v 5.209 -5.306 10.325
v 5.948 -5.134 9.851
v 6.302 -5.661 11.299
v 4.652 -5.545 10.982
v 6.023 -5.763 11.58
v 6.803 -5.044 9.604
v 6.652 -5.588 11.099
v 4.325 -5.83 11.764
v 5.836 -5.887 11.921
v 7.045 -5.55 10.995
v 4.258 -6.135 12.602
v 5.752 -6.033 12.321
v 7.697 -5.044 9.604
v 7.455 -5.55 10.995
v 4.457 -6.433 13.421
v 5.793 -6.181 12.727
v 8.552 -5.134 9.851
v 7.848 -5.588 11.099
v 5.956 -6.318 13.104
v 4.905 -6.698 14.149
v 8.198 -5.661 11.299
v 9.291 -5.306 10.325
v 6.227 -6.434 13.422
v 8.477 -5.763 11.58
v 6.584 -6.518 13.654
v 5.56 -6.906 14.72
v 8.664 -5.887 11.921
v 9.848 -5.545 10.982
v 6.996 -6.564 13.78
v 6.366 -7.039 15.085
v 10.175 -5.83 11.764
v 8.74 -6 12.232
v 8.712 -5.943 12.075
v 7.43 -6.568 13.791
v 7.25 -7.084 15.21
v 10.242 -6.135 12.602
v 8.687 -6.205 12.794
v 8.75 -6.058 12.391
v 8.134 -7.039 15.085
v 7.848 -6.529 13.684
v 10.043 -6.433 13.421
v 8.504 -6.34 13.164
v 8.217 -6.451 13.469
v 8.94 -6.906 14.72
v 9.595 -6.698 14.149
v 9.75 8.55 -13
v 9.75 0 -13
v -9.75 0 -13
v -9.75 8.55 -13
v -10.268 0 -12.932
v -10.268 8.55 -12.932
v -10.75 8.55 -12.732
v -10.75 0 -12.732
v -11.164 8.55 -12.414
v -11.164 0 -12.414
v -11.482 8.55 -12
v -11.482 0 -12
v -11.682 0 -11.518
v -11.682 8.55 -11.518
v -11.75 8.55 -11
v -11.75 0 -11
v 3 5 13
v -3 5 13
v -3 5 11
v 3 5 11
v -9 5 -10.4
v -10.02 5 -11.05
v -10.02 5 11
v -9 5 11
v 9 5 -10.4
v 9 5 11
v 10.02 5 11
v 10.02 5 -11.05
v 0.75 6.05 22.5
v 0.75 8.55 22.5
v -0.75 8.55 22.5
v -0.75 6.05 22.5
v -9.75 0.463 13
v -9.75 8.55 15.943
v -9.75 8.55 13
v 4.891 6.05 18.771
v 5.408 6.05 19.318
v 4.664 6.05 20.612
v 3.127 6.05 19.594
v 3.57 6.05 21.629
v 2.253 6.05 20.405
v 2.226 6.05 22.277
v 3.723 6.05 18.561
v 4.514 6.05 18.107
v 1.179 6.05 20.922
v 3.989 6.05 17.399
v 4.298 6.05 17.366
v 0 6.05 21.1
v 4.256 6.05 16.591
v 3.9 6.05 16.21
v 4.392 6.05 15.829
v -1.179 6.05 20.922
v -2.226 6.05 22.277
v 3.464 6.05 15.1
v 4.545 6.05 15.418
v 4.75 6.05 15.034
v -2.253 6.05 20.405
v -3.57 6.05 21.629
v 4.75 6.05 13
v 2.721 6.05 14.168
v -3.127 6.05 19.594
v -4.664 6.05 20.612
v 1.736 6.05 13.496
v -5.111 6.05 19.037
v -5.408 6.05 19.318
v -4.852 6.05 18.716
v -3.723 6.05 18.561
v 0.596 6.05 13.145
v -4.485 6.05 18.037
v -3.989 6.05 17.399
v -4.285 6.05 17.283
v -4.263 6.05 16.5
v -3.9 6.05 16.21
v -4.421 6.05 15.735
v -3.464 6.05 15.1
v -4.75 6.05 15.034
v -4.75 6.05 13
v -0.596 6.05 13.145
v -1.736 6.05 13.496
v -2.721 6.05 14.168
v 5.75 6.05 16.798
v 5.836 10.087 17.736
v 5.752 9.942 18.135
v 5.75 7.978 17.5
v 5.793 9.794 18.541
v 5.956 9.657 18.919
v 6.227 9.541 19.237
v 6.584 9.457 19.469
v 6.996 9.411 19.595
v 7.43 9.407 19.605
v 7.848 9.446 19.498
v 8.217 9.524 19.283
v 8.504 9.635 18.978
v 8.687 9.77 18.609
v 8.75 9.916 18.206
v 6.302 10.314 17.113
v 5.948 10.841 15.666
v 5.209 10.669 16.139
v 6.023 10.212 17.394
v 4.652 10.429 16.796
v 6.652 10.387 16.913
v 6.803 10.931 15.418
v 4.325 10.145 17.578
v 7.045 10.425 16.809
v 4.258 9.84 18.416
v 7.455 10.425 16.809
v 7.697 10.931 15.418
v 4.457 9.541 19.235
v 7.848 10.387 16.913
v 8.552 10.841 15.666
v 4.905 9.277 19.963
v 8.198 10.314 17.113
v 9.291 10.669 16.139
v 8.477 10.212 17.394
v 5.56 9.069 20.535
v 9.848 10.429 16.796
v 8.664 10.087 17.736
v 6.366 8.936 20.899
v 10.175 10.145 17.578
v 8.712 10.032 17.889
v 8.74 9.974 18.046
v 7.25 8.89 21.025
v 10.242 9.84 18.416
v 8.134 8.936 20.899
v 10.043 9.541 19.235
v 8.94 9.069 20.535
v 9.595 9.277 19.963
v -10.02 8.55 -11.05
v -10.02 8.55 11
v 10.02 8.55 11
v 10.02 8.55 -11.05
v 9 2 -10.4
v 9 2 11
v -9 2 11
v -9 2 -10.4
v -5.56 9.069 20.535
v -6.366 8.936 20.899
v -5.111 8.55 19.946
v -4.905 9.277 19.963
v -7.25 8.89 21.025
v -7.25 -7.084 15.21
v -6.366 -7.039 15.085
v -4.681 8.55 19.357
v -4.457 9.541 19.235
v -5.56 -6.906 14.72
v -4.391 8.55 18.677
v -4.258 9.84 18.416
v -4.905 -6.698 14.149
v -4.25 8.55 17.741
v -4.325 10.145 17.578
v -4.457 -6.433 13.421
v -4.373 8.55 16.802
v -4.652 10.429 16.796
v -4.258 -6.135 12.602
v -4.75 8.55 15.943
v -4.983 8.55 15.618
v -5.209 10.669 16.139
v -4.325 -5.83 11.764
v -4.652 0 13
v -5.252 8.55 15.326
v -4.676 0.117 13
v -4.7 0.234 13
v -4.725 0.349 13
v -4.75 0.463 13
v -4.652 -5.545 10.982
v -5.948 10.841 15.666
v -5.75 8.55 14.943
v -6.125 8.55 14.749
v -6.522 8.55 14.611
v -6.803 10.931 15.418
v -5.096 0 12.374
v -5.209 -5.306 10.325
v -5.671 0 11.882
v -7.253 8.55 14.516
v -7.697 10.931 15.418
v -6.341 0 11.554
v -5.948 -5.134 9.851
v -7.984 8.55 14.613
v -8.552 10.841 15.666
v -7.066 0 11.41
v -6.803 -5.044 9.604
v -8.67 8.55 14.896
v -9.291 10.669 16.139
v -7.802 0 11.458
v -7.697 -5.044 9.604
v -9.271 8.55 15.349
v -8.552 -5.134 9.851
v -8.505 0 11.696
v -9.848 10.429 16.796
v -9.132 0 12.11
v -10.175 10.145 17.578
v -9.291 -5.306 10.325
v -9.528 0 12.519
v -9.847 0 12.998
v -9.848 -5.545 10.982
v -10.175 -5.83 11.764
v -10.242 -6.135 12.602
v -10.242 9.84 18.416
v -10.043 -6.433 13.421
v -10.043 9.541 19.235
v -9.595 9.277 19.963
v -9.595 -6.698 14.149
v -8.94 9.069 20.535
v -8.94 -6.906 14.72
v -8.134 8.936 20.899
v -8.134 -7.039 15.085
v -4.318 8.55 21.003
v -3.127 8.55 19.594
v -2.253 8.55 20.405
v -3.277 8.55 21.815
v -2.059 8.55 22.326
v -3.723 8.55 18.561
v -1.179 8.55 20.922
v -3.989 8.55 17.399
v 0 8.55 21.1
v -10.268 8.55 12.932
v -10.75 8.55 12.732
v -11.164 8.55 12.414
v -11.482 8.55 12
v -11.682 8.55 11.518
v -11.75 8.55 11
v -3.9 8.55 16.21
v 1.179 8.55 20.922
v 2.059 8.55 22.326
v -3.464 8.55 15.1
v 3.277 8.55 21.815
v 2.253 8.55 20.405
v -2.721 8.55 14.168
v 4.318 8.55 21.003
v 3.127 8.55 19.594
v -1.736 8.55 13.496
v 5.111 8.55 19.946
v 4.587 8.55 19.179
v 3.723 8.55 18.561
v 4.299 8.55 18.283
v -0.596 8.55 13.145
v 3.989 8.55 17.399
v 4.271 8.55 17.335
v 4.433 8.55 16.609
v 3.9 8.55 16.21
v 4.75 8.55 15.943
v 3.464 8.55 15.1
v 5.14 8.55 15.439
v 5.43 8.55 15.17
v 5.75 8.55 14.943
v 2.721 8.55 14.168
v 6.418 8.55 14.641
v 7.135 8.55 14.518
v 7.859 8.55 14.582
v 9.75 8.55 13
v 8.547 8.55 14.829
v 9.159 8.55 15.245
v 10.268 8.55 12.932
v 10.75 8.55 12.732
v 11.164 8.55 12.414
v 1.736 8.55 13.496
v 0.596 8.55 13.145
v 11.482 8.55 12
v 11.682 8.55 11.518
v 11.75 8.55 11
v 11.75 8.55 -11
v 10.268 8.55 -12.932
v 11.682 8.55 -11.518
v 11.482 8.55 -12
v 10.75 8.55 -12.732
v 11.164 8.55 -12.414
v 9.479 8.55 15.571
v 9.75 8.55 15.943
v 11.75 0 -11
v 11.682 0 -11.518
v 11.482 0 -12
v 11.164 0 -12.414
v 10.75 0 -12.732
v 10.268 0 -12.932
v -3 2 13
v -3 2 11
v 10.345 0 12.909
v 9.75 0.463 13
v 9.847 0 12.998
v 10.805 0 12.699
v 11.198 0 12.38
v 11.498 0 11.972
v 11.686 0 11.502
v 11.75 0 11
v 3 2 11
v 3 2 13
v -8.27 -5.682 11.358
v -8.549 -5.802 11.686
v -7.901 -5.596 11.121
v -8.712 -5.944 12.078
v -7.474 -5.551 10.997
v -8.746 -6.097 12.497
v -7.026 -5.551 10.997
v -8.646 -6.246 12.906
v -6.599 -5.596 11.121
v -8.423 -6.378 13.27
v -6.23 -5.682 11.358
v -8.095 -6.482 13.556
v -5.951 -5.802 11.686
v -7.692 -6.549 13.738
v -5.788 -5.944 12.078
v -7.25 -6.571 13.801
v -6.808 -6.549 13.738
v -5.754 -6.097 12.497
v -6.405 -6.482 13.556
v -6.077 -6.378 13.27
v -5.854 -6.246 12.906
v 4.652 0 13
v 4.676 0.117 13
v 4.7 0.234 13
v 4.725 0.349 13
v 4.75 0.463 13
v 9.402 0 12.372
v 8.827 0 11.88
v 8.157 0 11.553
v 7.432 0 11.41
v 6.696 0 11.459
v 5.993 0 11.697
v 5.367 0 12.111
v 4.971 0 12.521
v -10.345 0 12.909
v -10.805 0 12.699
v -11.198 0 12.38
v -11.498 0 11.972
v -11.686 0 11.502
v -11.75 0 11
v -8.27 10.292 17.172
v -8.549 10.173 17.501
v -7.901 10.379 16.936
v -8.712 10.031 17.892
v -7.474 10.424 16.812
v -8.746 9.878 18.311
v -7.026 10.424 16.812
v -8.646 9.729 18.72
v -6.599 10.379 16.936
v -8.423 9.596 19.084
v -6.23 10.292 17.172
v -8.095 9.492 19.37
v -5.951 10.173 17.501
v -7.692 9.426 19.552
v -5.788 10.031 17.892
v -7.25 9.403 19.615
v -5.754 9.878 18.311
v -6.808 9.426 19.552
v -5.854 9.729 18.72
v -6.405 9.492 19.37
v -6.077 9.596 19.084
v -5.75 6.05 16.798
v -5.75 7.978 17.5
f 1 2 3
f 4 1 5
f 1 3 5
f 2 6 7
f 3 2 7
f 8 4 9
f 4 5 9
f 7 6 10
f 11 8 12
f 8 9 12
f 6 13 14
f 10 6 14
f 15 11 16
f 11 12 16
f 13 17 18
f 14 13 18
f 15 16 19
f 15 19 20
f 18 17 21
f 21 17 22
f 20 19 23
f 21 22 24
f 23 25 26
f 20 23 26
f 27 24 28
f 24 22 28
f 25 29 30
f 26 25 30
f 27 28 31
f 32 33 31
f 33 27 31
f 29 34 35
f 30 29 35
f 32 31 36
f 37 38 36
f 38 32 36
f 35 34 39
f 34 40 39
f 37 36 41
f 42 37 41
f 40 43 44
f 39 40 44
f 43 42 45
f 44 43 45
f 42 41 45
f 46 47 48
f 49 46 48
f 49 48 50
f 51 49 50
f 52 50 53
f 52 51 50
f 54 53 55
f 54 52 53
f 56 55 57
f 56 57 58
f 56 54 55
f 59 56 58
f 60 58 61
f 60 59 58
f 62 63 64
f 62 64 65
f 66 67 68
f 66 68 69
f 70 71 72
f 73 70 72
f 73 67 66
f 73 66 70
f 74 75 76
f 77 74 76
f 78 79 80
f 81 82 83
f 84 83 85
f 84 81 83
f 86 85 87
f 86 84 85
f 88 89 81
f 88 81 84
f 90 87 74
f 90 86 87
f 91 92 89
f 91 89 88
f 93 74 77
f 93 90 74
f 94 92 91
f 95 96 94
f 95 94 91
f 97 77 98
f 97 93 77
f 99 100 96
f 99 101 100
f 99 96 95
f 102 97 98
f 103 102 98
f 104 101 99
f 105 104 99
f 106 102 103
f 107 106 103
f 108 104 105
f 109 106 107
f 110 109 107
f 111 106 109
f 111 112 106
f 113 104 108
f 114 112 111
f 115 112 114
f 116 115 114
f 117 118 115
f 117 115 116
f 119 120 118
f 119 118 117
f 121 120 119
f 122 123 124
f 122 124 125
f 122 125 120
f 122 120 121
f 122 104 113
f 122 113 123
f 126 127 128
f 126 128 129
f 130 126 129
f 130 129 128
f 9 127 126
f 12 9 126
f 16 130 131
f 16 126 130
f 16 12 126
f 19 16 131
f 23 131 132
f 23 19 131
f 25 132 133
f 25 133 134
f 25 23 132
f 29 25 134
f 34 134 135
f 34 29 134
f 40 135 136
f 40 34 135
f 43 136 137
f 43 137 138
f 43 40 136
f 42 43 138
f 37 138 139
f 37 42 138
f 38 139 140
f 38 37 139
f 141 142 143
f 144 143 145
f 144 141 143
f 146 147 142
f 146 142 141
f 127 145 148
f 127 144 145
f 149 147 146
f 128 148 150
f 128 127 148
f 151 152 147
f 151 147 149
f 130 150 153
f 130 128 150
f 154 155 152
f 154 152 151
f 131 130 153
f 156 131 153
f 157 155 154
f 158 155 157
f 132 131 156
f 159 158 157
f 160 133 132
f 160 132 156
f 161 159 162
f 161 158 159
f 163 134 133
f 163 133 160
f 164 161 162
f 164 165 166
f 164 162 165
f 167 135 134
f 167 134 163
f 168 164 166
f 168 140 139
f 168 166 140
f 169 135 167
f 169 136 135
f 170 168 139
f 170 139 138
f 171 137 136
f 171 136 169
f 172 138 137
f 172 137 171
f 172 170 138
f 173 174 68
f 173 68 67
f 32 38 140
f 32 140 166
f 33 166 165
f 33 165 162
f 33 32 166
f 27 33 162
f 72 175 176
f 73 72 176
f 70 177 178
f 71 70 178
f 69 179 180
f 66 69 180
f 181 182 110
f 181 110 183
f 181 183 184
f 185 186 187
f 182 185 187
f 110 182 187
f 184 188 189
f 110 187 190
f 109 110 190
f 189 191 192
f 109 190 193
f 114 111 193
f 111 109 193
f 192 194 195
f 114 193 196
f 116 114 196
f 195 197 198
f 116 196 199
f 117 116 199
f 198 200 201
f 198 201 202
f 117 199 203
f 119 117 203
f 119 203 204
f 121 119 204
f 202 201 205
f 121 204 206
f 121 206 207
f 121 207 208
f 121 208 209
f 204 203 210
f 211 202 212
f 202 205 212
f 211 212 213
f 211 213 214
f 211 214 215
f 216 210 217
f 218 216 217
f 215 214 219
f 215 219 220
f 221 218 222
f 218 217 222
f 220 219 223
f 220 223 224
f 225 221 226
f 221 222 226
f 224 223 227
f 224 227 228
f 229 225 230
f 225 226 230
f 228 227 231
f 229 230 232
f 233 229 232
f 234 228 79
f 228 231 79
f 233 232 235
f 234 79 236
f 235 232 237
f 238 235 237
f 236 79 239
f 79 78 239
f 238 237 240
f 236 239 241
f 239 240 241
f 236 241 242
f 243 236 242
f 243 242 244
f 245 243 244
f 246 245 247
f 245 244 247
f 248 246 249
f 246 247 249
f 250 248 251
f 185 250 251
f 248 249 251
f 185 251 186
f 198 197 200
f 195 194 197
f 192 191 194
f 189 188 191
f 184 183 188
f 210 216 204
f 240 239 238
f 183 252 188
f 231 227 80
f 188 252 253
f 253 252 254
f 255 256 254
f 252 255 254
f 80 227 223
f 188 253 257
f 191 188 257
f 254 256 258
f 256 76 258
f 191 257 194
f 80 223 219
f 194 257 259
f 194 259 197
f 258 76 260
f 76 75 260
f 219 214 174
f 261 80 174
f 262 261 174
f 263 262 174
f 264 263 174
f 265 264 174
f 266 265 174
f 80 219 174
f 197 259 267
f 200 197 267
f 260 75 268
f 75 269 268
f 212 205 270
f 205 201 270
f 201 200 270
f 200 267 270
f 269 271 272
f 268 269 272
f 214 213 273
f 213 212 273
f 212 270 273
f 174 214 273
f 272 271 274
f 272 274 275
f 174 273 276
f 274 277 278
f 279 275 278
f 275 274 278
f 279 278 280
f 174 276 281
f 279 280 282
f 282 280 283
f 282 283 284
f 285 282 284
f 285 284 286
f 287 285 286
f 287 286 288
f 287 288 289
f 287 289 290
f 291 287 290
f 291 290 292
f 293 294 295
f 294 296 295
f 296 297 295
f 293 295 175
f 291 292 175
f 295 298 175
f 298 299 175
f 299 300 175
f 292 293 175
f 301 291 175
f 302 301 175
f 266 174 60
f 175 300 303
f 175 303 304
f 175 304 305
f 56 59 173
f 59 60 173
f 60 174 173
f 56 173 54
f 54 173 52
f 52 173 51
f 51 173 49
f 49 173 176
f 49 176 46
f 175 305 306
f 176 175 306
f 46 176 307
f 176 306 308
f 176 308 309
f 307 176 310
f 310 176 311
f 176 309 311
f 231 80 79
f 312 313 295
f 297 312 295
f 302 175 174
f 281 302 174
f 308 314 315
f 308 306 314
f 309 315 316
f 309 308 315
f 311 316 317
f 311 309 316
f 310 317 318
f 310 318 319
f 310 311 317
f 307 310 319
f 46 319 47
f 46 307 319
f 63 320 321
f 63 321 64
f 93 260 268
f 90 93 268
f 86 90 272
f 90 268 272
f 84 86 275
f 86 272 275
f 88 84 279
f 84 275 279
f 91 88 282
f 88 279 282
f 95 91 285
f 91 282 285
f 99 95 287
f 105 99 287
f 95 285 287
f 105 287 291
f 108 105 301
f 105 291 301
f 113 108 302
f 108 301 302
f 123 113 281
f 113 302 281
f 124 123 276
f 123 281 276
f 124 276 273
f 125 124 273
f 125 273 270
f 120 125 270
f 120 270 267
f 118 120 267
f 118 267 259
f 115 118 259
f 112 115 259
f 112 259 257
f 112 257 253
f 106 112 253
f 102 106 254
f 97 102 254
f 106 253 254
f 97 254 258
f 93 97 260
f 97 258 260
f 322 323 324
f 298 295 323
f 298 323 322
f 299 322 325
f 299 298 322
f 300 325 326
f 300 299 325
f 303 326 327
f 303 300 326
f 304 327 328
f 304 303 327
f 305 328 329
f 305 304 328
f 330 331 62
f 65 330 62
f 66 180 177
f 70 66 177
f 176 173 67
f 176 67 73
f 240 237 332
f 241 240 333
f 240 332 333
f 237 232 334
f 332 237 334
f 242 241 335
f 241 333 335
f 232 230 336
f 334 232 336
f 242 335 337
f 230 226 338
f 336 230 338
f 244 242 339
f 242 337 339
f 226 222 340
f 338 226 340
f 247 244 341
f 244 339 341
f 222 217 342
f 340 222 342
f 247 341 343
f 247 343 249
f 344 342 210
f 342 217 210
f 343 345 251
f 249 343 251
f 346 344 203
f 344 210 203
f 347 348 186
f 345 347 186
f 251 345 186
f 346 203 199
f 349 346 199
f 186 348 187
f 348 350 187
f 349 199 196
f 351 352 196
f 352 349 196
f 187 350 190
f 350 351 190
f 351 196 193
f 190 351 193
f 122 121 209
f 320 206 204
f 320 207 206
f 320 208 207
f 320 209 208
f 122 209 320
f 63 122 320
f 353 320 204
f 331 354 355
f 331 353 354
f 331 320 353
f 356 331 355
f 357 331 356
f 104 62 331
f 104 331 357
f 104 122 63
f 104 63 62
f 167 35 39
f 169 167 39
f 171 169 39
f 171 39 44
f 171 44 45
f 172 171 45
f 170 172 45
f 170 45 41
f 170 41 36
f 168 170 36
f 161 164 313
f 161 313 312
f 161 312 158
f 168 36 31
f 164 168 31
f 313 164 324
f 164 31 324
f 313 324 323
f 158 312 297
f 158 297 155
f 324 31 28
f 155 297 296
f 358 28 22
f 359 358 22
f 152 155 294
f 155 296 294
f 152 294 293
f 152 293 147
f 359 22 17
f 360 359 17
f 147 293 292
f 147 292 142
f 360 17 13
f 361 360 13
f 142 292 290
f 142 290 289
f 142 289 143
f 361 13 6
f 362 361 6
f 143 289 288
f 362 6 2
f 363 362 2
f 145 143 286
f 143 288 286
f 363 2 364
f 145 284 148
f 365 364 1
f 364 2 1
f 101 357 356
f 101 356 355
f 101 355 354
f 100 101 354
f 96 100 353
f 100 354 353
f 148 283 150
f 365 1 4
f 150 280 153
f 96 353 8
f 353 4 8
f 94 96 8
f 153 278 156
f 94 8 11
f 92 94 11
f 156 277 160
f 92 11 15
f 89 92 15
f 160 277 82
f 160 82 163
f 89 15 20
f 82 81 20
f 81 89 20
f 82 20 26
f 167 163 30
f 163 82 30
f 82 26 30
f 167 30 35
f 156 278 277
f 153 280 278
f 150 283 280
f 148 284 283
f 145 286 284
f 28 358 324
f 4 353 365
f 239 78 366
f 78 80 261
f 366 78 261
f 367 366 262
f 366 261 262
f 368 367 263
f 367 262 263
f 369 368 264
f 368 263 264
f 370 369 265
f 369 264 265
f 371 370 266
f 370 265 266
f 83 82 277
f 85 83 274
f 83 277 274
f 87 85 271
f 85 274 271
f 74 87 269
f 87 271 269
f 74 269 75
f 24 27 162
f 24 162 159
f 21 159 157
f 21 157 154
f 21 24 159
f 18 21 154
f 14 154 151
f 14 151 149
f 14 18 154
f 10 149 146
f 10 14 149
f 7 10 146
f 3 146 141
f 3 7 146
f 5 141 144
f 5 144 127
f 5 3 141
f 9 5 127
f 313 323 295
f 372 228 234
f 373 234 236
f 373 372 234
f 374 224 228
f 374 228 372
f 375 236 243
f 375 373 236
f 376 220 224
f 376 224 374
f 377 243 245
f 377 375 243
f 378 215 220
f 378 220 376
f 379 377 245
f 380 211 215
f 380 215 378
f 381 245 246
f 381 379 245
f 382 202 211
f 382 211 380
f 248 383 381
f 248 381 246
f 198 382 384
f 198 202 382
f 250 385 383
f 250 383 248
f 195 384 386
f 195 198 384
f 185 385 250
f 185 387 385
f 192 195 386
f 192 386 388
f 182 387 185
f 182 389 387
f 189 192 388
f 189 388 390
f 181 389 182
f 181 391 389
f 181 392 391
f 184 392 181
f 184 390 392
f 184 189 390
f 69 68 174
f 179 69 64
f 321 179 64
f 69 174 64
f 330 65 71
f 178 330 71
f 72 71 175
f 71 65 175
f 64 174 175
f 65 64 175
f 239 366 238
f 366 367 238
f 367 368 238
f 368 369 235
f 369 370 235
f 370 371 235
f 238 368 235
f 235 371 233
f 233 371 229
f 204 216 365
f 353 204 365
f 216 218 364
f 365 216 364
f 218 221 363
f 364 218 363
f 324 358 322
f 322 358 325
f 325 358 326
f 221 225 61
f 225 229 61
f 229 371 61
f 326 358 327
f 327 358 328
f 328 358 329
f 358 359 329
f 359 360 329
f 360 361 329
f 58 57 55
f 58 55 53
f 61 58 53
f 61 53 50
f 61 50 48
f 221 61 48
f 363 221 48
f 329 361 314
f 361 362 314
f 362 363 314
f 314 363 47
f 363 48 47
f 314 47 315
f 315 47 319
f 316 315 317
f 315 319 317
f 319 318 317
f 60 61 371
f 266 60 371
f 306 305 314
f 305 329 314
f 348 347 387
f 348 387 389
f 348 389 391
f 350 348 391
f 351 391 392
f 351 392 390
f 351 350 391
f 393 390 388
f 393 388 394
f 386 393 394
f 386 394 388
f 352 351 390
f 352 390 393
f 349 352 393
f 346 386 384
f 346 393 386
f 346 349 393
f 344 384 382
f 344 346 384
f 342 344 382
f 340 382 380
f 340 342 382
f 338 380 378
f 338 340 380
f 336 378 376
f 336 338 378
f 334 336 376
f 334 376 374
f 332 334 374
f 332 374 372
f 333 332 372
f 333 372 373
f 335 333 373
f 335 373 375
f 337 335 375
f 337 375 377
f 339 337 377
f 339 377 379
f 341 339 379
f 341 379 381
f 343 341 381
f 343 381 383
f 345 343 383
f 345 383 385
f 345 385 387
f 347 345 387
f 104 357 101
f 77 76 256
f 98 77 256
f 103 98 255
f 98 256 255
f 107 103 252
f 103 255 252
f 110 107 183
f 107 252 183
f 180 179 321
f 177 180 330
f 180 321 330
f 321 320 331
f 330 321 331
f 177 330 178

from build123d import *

# Parameters (mm, degrees)
BOSS_EXTRUDE1_DEPTH       = 8.55
SKETCH1_4_W               = 18
SKETCH1_4_H               = 23.4
BOSS_EXTRUDE2_DEPTH       = 2
SKETCH2_W                 = 20.04
SKETCH2_H                 = 24.05
CUT_EXTRUDE1_DEPTH        = 3.55
SKETCH3_W                 = 6
SKETCH3_H                 = 3
BOSS_EXTRUDE4_DEPTH       = 2
FILLET1_R                 = 2
BOSS_EXTRUDE5_DEPTH       = 23.5
SKETCH6_W                 = 2
SKETCH6_H                 = 3.111945503
SKETCH6_W_2               = 9.5
CUT_EXTRUDE2_DEPTH        = 23
SKETCH7_W                 = 5
SKETCH7_H                 = 1.291023664
BOSS_EXTRUDE6_DEPTH       = 1
BOSS_EXTRUDE11_DEPTH      = 2
BOSS_EXTRUDE11_DEPTH_BACK = 15
SKETCH8_R                 = 3
CUT_EXTRUDE3_DEPTH        = 2
CUT_EXTRUDE3_DEPTH_BACK   = 15
SKETCH8_5_R               = 1.5
SKETCH10_R                = 4
BOSS_EXTRUDE13_DEPTH      = 2.5


with BuildPart() as part:
    # Sketch1 → Boss-Extrude1 (new body)
    with BuildSketch(Plane(origin=(0, 0, 0), x_dir=(1, 0, 0), z_dir=(0, 1, 0))):
        Polygon((-11.75, 13), (-11.75, -13), (-9, -13), (-9, 10.4), (9, 10.4), (9, -13), (11.75, -13), (11.75, 13), align=None)
    extrude(amount=BOSS_EXTRUDE1_DEPTH)

    # Sketch1<4> → Boss-Extrude2 (add)
    with BuildSketch(Plane(origin=(0, 0, 0), x_dir=(1, 0, 0), z_dir=(0, 1, 0))):
        with Locations((0, -1.3)):
            Rectangle(SKETCH1_4_W, SKETCH1_4_H)
    extrude(amount=BOSS_EXTRUDE2_DEPTH)

    # Sketch2 → Cut-Extrude1 (cut)
    with BuildSketch(Plane(origin=(0, 8.55, 0), x_dir=(1, 0, 0), z_dir=(0, 1, 0))):
        with Locations((0, -0.975)):
            Rectangle(SKETCH2_W, SKETCH2_H)
    extrude(amount=-CUT_EXTRUDE1_DEPTH, mode=Mode.SUBTRACT)

    # Sketch3 → Boss-Extrude4 (add)
    with BuildSketch(Plane.XY.offset(13)):
        Polygon((-11.75, 8.55), (-3, 8.55), (3, 8.55), (11.75, 8.55), (11.75, 0), (3, 0), (-3, 0), (-11.75, 0), align=None)
        with Locations((0, 3.5)):
            Rectangle(SKETCH3_W, SKETCH3_H, mode=Mode.SUBTRACT)
    extrude(amount=-BOSS_EXTRUDE4_DEPTH)

    # Fillet1
    fillet1_edges = [part.edges().sort_by_distance(p)[0] for p in [
        (11.75, 4.275, 13),
        (11.75, 4.275, -13),
        (-11.75, 4.275, -13),
        (-11.75, 4.275, 13),
    ]]
    fillet(fillet1_edges, radius=FILLET1_R)

    # Sketch5 → Boss-Extrude5 (add)
    with BuildSketch(Plane(origin=(11.75, 0, 0), x_dir=(0, 0, -1), z_dir=(1, 0, 0))):
        Polygon((-13, 0), (-16.111945503, 8.55), (-13, 8.55), align=None)
    extrude(amount=-BOSS_EXTRUDE5_DEPTH)

    # Sketch6 → Cut-Extrude2 (cut)
    with BuildSketch(Plane(origin=(0, 8.55, 0), x_dir=(1, 0, 0), z_dir=(0, 1, 0))):
        with Locations((-10.75, -14.555972752)):
            Rectangle(SKETCH6_W, SKETCH6_H)
        with Locations((10.75, -14.555972752)):
            Rectangle(SKETCH6_W, SKETCH6_H)
        with Locations((0, -14.555972752)):
            Rectangle(SKETCH6_W_2, SKETCH6_H)
    extrude(amount=-CUT_EXTRUDE2_DEPTH, mode=Mode.SUBTRACT)

    # Sketch7 → Boss-Extrude6 (add)
    with BuildSketch(Plane(origin=(0, -4.178119463, 11.47928888), x_dir=(1, 0, 0), z_dir=(0, -0.34202014332566966, 0.939692620785908))):
        with Locations((7.25, 12.899469986)):
            Rectangle(SKETCH7_W, SKETCH7_H)
    extrude(amount=BOSS_EXTRUDE6_DEPTH)

    # Sketch8 → Boss-Extrude11 (add, two sides: drawn at the far end of the back side and taken through both)
    with BuildSketch(Plane(origin=(0, 12.728119463, 4.632656623), x_dir=(1, 0, 0), z_dir=(0, 0.939692620785908, 0.3420201433256697)).offset(-BOSS_EXTRUDE11_DEPTH_BACK)):
        with Locations((7.25, -13.71600407)):
            Circle(SKETCH8_R)
        with Locations((-7.25, -13.71600407)):
            Circle(SKETCH8_R)
    extrude(amount=BOSS_EXTRUDE11_DEPTH + BOSS_EXTRUDE11_DEPTH_BACK)

    # Sketch8<5> → Cut-Extrude3 (cut, two sides: drawn at the far end of the back side and taken through both)
    with BuildSketch(Plane(origin=(0, 12.728119463, 4.632656623), x_dir=(1, 0, 0), z_dir=(0, 0.939692620785908, 0.3420201433256697)).offset(-CUT_EXTRUDE3_DEPTH_BACK)):
        with Locations((-7.25, -13.71600407)):
            Circle(SKETCH8_5_R)
        with Locations((7.25, -13.71600407)):
            Circle(SKETCH8_5_R)
    extrude(amount=CUT_EXTRUDE3_DEPTH + CUT_EXTRUDE3_DEPTH_BACK, mode=Mode.SUBTRACT)

    # Sketch10 → Boss-Extrude13 (add)
    with BuildSketch(Plane(origin=(0, 8.55, 0), x_dir=(1, 0, 0), z_dir=(0, 1, 0))):
        with BuildLine():
            Line((-5.75, -11), (5.75, -11))
            Line((5.75, -11), (5.75, -17.5))
            ThreePointArc((5.75, -17.5), (4.285533906, -21.035533906), (0.75, -22.5))
            Line((0.75, -22.5), (-0.75, -22.5))
            ThreePointArc((-0.75, -22.5), (-4.285533906, -21.035533906), (-5.75, -17.5))
            Line((-5.75, -17.5), (-5.75, -11))
        make_face()
        with Locations((0, -17.1)):
            Circle(SKETCH10_R, mode=Mode.SUBTRACT)
    extrude(amount=-BOSS_EXTRUDE13_DEPTH)


solid = part.part
